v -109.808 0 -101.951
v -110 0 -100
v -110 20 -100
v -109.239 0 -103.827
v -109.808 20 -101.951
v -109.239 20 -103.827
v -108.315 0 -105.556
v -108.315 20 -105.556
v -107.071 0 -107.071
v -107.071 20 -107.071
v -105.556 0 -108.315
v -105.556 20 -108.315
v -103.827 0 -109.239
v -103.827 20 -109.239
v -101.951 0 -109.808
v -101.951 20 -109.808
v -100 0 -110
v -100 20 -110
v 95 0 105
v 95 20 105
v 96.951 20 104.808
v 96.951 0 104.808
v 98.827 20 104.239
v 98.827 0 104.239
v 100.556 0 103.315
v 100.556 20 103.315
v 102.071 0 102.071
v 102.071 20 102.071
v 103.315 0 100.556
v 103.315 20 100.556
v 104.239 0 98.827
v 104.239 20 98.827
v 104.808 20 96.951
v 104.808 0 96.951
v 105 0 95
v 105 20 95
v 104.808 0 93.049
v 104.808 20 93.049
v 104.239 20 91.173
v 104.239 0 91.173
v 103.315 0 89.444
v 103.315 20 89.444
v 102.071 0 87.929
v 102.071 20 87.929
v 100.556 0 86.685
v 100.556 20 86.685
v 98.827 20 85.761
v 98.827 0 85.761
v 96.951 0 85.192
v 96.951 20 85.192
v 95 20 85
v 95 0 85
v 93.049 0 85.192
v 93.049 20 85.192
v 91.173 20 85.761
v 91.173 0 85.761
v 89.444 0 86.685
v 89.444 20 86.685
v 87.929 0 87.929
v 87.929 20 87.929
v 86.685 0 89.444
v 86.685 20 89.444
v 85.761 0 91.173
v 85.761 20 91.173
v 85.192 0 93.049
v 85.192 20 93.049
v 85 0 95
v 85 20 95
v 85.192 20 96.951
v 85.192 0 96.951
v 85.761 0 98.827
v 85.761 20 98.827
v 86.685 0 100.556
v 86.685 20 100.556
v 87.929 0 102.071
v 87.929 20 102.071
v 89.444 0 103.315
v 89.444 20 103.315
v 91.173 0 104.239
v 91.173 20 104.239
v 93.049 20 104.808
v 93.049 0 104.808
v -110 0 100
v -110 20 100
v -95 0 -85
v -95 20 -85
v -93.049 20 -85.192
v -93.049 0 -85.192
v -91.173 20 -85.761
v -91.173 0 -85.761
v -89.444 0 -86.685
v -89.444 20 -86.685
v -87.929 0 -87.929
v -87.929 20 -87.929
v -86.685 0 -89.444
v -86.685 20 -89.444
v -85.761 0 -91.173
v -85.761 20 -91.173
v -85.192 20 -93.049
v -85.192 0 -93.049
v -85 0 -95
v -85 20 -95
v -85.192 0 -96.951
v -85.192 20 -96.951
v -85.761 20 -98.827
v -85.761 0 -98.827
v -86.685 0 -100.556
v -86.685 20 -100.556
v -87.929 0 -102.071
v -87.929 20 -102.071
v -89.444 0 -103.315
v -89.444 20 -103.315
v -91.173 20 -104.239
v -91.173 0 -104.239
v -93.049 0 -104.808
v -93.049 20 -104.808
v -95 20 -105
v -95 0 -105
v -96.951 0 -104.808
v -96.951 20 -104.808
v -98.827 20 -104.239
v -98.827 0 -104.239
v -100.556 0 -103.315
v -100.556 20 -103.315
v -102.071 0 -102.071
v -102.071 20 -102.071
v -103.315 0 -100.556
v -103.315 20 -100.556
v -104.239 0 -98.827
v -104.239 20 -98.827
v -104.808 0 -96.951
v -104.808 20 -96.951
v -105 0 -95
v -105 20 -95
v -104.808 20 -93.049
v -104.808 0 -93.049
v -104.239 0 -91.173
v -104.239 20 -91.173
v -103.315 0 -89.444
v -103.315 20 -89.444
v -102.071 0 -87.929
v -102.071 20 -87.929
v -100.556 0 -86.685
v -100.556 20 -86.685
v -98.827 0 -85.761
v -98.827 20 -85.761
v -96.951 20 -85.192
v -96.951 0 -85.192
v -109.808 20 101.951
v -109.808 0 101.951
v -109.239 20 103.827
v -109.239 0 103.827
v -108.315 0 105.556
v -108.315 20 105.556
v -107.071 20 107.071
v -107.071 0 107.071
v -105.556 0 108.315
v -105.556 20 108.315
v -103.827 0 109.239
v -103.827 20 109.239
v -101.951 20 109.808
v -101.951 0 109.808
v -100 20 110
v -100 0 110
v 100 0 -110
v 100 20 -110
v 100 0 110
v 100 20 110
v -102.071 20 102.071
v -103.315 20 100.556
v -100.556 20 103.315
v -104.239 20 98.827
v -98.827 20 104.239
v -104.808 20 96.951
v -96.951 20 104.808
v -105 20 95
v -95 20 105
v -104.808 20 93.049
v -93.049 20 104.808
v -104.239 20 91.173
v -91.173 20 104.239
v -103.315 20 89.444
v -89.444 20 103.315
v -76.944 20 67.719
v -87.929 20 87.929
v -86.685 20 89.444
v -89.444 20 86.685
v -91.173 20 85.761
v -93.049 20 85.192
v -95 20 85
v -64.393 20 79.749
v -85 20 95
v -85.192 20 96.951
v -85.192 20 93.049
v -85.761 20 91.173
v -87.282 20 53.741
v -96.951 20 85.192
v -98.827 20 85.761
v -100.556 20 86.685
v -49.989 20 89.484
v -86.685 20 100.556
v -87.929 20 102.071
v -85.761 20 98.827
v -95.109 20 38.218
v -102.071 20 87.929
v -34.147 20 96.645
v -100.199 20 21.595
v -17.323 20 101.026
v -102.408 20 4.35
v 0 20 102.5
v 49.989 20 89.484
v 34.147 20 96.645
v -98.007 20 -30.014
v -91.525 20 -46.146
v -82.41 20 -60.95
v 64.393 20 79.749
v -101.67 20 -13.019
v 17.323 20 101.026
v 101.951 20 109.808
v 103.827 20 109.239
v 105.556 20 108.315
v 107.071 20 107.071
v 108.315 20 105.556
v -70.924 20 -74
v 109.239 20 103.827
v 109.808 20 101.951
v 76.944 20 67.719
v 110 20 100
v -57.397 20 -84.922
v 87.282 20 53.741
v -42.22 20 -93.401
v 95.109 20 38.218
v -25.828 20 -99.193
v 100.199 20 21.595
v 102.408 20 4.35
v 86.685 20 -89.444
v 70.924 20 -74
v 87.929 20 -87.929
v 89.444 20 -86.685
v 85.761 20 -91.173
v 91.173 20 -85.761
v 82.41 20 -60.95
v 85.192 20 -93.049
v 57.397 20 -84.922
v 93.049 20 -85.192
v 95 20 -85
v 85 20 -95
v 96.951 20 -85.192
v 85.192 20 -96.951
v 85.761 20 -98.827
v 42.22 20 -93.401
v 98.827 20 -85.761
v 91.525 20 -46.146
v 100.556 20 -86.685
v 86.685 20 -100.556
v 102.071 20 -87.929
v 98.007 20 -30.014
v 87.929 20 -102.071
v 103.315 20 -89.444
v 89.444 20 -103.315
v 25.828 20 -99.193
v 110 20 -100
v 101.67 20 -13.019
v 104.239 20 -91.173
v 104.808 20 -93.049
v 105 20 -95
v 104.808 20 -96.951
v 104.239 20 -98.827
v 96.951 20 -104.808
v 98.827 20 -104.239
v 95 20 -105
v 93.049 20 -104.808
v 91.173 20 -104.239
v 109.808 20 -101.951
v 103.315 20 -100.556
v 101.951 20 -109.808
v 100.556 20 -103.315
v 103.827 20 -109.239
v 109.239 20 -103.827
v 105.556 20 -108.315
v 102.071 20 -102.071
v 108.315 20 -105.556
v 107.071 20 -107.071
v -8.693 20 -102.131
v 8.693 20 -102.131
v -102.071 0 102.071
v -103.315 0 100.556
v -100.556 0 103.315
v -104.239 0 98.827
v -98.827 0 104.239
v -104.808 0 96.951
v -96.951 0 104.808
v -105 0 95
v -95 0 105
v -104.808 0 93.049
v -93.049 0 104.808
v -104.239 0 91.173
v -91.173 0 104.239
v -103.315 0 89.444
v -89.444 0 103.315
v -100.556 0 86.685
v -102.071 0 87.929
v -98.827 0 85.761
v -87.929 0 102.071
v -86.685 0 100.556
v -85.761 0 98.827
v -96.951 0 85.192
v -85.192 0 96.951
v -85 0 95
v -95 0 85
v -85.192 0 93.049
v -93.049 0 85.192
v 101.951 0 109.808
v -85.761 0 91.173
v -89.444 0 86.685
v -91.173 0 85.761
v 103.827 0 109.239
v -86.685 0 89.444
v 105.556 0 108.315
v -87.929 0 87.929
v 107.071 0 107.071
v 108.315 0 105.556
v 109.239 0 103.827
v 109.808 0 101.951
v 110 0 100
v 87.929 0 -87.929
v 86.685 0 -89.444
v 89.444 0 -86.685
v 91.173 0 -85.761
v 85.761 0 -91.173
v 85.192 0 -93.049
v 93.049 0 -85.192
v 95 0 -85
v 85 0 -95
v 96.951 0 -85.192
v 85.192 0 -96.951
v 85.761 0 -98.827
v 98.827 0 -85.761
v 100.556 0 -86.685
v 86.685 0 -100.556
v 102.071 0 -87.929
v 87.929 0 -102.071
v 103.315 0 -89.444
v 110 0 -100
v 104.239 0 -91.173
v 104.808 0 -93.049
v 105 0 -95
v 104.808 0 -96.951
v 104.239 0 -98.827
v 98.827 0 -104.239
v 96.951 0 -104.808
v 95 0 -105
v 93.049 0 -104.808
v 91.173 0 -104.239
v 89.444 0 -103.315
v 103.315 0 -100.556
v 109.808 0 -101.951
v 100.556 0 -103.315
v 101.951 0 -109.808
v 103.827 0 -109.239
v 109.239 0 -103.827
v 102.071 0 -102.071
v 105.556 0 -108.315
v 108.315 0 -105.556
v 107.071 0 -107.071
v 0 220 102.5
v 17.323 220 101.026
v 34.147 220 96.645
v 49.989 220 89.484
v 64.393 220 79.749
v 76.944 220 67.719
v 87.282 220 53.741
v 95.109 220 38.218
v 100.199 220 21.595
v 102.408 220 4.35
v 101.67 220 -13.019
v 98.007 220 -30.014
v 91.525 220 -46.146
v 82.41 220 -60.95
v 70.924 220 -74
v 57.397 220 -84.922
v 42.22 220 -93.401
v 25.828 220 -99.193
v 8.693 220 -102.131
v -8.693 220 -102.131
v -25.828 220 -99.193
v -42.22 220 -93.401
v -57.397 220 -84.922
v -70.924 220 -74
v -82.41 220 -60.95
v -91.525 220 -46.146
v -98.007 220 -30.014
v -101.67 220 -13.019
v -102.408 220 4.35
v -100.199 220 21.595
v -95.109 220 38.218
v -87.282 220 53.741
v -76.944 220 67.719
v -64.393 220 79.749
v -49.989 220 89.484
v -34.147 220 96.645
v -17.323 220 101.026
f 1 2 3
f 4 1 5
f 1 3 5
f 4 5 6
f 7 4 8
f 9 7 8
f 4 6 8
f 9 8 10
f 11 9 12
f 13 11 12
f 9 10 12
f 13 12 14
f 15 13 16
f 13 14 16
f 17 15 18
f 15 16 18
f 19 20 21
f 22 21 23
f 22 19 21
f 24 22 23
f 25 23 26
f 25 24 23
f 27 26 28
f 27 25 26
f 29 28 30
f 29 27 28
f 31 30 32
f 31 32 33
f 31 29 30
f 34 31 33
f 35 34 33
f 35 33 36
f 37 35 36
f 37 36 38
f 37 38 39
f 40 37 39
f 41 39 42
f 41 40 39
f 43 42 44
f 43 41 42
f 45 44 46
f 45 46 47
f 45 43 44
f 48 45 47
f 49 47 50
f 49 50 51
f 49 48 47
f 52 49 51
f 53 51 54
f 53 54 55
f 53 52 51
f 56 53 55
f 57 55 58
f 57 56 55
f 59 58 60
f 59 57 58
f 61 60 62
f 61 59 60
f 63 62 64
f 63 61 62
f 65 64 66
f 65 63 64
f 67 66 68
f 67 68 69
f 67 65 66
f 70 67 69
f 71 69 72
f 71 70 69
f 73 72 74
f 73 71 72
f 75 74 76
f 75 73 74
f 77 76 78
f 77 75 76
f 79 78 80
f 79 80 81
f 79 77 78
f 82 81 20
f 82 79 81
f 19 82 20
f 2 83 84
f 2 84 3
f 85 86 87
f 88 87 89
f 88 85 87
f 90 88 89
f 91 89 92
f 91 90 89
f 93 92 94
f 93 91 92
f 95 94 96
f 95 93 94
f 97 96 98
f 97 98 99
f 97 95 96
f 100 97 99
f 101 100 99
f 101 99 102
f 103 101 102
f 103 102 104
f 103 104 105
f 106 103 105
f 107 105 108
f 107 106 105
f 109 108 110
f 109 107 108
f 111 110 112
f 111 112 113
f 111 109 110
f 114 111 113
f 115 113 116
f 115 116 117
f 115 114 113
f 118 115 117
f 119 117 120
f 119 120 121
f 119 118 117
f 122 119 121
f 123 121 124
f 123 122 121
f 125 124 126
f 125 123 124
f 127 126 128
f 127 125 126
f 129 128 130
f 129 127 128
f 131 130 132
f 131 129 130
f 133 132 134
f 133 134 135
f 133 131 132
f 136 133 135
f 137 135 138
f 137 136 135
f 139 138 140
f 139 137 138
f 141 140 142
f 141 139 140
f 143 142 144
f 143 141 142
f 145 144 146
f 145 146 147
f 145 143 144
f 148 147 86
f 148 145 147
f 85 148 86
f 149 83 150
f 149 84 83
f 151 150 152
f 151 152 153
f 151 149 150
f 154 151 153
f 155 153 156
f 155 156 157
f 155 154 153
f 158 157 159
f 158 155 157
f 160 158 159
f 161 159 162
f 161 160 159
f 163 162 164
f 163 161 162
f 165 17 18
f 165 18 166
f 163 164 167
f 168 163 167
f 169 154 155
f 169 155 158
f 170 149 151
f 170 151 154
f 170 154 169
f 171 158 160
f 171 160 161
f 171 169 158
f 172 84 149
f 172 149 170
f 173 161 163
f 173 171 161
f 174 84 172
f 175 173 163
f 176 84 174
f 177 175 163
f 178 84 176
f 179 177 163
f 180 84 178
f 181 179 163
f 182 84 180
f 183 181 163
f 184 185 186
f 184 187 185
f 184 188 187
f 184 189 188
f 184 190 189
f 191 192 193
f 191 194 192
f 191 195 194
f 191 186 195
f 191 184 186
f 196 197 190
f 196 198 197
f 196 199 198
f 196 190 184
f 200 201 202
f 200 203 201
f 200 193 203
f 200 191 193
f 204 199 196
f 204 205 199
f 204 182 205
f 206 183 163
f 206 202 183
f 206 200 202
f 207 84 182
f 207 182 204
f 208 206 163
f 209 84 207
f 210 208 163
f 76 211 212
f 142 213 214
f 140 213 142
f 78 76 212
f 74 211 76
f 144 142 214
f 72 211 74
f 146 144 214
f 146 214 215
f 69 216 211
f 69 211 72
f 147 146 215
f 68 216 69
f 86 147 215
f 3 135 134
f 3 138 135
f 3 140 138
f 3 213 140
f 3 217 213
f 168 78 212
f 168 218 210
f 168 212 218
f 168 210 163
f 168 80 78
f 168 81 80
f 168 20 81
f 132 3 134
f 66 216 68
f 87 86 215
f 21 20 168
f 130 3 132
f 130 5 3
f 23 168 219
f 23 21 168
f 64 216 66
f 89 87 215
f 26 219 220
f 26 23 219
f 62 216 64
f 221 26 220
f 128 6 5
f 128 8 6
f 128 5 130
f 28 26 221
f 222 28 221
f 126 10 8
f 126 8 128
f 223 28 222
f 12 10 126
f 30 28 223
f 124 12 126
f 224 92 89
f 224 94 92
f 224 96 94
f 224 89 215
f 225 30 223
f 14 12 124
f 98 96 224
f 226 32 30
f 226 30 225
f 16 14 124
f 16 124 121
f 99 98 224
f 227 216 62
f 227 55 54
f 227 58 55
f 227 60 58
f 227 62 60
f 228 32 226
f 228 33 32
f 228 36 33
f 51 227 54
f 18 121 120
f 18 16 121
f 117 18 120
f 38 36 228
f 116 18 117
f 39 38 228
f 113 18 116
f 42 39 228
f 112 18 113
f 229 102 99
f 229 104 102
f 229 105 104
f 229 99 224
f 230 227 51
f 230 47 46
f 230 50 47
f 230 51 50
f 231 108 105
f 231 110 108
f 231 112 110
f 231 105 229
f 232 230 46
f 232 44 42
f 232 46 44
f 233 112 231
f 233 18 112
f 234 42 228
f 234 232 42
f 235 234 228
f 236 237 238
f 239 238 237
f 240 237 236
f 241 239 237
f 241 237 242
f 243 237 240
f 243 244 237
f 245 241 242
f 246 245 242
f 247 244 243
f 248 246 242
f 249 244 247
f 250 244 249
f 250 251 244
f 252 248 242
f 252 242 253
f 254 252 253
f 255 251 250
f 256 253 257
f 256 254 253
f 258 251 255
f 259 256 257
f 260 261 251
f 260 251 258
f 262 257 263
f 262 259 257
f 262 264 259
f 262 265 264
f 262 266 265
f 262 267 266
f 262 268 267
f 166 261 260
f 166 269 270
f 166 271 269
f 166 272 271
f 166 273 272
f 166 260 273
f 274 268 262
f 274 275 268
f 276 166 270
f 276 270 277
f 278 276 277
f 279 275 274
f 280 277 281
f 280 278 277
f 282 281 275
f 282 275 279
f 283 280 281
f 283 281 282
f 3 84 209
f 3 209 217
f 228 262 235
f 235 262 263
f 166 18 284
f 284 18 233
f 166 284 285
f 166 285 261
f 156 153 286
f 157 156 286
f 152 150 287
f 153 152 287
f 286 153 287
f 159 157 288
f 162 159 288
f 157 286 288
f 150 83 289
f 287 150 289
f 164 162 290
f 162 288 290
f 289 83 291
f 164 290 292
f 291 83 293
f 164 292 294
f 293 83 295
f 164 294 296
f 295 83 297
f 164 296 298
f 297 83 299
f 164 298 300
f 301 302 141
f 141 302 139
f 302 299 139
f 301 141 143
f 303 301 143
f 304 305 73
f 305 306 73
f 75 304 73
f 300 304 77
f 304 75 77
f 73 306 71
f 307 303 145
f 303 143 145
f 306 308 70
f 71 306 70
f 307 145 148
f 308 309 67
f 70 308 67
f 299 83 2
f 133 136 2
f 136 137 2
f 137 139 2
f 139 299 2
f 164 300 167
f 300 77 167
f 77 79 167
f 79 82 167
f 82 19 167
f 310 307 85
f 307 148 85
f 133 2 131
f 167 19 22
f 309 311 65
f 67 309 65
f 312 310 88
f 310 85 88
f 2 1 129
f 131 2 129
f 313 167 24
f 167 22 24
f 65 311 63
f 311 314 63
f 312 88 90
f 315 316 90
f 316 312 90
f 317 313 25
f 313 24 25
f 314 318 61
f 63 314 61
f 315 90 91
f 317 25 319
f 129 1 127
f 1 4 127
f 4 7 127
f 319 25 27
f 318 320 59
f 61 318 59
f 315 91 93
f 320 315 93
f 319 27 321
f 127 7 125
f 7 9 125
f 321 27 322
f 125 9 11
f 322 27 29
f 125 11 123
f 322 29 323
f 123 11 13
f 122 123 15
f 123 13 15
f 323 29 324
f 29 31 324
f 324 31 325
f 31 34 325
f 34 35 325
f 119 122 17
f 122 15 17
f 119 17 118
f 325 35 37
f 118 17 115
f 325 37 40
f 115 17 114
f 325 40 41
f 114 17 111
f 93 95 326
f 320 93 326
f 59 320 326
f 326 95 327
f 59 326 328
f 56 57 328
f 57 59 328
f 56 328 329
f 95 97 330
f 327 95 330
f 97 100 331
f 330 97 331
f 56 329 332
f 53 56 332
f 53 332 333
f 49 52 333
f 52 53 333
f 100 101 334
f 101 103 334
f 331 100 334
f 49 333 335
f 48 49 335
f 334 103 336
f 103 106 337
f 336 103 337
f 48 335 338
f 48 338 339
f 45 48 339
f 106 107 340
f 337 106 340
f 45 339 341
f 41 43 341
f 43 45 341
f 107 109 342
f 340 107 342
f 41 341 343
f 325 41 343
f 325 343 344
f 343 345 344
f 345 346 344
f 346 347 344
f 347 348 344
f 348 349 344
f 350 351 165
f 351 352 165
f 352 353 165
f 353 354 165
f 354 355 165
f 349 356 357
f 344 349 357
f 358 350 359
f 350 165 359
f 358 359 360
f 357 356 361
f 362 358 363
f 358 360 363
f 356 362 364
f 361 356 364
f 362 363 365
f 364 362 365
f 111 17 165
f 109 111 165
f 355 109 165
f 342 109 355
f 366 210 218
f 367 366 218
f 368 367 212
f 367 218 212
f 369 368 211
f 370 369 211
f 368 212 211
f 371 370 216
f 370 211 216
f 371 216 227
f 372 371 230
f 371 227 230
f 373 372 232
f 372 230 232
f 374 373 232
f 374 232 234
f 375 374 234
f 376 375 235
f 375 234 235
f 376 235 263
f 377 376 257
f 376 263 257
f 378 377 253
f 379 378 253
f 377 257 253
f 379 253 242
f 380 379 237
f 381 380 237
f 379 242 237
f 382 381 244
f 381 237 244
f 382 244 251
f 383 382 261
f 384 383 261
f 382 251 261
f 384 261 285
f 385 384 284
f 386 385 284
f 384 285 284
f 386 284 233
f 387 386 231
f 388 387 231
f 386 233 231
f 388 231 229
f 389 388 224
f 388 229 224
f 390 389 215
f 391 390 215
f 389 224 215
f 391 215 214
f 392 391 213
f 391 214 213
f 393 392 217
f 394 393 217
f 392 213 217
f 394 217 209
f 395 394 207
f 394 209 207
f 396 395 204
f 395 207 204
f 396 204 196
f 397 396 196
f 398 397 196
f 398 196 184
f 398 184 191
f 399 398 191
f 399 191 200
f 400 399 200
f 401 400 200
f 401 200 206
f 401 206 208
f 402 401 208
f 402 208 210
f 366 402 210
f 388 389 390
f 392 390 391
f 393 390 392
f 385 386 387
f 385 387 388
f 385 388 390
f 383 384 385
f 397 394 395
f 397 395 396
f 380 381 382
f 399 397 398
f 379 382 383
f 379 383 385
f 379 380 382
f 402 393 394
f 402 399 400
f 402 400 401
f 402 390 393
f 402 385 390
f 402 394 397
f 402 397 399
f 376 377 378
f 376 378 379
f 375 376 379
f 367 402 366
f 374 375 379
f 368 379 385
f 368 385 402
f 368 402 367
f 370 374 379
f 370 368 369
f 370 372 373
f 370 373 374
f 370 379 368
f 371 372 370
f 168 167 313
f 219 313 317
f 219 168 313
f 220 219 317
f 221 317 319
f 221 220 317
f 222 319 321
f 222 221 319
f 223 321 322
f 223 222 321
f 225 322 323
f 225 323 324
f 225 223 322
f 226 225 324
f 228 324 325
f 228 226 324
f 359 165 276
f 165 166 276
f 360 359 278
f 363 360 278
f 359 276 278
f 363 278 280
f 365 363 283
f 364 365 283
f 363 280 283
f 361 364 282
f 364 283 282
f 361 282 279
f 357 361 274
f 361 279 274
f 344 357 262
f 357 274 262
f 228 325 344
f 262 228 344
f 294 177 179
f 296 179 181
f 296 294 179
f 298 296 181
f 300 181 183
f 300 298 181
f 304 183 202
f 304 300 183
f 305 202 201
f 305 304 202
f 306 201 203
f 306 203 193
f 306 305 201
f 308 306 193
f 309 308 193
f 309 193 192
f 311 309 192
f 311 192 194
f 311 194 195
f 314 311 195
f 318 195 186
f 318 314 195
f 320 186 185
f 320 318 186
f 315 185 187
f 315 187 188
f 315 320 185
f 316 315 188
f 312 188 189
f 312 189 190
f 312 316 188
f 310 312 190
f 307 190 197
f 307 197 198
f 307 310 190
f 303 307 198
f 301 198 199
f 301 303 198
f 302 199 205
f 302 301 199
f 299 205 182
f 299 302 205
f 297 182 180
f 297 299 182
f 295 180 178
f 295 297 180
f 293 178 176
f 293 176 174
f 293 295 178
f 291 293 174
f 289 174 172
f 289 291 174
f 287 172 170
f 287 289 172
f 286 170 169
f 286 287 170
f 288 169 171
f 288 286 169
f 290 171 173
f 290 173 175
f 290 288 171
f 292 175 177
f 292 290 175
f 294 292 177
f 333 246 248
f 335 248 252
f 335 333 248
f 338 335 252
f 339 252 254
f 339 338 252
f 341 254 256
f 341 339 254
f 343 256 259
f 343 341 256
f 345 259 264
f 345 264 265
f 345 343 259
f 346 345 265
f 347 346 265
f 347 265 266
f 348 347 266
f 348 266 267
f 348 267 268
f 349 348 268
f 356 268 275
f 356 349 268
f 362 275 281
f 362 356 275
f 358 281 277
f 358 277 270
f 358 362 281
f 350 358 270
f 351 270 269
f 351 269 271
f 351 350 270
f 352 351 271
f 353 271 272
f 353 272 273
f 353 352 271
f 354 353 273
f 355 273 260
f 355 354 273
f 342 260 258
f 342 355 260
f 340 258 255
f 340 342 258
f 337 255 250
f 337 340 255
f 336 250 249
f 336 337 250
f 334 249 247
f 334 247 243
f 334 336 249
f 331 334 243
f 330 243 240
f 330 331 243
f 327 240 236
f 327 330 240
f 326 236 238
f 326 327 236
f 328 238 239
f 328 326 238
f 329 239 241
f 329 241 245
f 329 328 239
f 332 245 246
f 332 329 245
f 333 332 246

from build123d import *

# Parameters (mm, degrees)
SKETCH1_W           = 220
SKETCH1_H           = 220
SKETCH1_R           = 10
BOSS_EXTRUDE2_DEPTH = 20
FILLET5_R           = 10
SKETCH6_R           = 102.5
BOSS_EXTRUDE3_DEPTH = 200


with BuildPart() as part:
    # Sketch1 → Boss-Extrude2 (new body)
    with BuildSketch(Plane(origin=(0, 0, 0), x_dir=(1, 0, 0), z_dir=(0, 1, 0))):
        Rectangle(SKETCH1_W, SKETCH1_H)
        with Locations(Location((-95, 95, 0), (0, 0, 270))):
            Circle(SKETCH1_R, mode=Mode.SUBTRACT)
        with Locations(Location((95, 95, 0), (0, 0, 270))):
            Circle(SKETCH1_R, mode=Mode.SUBTRACT)
        with Locations(Location((95, -95, 0), (0, 0, 270))):
            Circle(SKETCH1_R, mode=Mode.SUBTRACT)
        with Locations(Location((-95, -95, 0), (0, 0, 270))):
            Circle(SKETCH1_R, mode=Mode.SUBTRACT)
    extrude(amount=BOSS_EXTRUDE2_DEPTH)

    # Fillet5
    fillet5_edges = [part.edges().sort_by_distance(p)[0] for p in [
        (110, 10, 110),
        (-110, 10, 110),
        (-110, 10, -110),
        (110, 10, -110),
    ]]
    fillet(fillet5_edges, radius=FILLET5_R)

    # Sketch6 → Boss-Extrude3 (add)
    with BuildSketch(Plane(origin=(0, 20, 0), x_dir=(1, 0, 0), z_dir=(0, 1, 0))):
        with Locations(Location((0, 0, 0), (0, 0, 270))):
            Circle(SKETCH6_R)
    extrude(amount=BOSS_EXTRUDE3_DEPTH)


solid = part.part
